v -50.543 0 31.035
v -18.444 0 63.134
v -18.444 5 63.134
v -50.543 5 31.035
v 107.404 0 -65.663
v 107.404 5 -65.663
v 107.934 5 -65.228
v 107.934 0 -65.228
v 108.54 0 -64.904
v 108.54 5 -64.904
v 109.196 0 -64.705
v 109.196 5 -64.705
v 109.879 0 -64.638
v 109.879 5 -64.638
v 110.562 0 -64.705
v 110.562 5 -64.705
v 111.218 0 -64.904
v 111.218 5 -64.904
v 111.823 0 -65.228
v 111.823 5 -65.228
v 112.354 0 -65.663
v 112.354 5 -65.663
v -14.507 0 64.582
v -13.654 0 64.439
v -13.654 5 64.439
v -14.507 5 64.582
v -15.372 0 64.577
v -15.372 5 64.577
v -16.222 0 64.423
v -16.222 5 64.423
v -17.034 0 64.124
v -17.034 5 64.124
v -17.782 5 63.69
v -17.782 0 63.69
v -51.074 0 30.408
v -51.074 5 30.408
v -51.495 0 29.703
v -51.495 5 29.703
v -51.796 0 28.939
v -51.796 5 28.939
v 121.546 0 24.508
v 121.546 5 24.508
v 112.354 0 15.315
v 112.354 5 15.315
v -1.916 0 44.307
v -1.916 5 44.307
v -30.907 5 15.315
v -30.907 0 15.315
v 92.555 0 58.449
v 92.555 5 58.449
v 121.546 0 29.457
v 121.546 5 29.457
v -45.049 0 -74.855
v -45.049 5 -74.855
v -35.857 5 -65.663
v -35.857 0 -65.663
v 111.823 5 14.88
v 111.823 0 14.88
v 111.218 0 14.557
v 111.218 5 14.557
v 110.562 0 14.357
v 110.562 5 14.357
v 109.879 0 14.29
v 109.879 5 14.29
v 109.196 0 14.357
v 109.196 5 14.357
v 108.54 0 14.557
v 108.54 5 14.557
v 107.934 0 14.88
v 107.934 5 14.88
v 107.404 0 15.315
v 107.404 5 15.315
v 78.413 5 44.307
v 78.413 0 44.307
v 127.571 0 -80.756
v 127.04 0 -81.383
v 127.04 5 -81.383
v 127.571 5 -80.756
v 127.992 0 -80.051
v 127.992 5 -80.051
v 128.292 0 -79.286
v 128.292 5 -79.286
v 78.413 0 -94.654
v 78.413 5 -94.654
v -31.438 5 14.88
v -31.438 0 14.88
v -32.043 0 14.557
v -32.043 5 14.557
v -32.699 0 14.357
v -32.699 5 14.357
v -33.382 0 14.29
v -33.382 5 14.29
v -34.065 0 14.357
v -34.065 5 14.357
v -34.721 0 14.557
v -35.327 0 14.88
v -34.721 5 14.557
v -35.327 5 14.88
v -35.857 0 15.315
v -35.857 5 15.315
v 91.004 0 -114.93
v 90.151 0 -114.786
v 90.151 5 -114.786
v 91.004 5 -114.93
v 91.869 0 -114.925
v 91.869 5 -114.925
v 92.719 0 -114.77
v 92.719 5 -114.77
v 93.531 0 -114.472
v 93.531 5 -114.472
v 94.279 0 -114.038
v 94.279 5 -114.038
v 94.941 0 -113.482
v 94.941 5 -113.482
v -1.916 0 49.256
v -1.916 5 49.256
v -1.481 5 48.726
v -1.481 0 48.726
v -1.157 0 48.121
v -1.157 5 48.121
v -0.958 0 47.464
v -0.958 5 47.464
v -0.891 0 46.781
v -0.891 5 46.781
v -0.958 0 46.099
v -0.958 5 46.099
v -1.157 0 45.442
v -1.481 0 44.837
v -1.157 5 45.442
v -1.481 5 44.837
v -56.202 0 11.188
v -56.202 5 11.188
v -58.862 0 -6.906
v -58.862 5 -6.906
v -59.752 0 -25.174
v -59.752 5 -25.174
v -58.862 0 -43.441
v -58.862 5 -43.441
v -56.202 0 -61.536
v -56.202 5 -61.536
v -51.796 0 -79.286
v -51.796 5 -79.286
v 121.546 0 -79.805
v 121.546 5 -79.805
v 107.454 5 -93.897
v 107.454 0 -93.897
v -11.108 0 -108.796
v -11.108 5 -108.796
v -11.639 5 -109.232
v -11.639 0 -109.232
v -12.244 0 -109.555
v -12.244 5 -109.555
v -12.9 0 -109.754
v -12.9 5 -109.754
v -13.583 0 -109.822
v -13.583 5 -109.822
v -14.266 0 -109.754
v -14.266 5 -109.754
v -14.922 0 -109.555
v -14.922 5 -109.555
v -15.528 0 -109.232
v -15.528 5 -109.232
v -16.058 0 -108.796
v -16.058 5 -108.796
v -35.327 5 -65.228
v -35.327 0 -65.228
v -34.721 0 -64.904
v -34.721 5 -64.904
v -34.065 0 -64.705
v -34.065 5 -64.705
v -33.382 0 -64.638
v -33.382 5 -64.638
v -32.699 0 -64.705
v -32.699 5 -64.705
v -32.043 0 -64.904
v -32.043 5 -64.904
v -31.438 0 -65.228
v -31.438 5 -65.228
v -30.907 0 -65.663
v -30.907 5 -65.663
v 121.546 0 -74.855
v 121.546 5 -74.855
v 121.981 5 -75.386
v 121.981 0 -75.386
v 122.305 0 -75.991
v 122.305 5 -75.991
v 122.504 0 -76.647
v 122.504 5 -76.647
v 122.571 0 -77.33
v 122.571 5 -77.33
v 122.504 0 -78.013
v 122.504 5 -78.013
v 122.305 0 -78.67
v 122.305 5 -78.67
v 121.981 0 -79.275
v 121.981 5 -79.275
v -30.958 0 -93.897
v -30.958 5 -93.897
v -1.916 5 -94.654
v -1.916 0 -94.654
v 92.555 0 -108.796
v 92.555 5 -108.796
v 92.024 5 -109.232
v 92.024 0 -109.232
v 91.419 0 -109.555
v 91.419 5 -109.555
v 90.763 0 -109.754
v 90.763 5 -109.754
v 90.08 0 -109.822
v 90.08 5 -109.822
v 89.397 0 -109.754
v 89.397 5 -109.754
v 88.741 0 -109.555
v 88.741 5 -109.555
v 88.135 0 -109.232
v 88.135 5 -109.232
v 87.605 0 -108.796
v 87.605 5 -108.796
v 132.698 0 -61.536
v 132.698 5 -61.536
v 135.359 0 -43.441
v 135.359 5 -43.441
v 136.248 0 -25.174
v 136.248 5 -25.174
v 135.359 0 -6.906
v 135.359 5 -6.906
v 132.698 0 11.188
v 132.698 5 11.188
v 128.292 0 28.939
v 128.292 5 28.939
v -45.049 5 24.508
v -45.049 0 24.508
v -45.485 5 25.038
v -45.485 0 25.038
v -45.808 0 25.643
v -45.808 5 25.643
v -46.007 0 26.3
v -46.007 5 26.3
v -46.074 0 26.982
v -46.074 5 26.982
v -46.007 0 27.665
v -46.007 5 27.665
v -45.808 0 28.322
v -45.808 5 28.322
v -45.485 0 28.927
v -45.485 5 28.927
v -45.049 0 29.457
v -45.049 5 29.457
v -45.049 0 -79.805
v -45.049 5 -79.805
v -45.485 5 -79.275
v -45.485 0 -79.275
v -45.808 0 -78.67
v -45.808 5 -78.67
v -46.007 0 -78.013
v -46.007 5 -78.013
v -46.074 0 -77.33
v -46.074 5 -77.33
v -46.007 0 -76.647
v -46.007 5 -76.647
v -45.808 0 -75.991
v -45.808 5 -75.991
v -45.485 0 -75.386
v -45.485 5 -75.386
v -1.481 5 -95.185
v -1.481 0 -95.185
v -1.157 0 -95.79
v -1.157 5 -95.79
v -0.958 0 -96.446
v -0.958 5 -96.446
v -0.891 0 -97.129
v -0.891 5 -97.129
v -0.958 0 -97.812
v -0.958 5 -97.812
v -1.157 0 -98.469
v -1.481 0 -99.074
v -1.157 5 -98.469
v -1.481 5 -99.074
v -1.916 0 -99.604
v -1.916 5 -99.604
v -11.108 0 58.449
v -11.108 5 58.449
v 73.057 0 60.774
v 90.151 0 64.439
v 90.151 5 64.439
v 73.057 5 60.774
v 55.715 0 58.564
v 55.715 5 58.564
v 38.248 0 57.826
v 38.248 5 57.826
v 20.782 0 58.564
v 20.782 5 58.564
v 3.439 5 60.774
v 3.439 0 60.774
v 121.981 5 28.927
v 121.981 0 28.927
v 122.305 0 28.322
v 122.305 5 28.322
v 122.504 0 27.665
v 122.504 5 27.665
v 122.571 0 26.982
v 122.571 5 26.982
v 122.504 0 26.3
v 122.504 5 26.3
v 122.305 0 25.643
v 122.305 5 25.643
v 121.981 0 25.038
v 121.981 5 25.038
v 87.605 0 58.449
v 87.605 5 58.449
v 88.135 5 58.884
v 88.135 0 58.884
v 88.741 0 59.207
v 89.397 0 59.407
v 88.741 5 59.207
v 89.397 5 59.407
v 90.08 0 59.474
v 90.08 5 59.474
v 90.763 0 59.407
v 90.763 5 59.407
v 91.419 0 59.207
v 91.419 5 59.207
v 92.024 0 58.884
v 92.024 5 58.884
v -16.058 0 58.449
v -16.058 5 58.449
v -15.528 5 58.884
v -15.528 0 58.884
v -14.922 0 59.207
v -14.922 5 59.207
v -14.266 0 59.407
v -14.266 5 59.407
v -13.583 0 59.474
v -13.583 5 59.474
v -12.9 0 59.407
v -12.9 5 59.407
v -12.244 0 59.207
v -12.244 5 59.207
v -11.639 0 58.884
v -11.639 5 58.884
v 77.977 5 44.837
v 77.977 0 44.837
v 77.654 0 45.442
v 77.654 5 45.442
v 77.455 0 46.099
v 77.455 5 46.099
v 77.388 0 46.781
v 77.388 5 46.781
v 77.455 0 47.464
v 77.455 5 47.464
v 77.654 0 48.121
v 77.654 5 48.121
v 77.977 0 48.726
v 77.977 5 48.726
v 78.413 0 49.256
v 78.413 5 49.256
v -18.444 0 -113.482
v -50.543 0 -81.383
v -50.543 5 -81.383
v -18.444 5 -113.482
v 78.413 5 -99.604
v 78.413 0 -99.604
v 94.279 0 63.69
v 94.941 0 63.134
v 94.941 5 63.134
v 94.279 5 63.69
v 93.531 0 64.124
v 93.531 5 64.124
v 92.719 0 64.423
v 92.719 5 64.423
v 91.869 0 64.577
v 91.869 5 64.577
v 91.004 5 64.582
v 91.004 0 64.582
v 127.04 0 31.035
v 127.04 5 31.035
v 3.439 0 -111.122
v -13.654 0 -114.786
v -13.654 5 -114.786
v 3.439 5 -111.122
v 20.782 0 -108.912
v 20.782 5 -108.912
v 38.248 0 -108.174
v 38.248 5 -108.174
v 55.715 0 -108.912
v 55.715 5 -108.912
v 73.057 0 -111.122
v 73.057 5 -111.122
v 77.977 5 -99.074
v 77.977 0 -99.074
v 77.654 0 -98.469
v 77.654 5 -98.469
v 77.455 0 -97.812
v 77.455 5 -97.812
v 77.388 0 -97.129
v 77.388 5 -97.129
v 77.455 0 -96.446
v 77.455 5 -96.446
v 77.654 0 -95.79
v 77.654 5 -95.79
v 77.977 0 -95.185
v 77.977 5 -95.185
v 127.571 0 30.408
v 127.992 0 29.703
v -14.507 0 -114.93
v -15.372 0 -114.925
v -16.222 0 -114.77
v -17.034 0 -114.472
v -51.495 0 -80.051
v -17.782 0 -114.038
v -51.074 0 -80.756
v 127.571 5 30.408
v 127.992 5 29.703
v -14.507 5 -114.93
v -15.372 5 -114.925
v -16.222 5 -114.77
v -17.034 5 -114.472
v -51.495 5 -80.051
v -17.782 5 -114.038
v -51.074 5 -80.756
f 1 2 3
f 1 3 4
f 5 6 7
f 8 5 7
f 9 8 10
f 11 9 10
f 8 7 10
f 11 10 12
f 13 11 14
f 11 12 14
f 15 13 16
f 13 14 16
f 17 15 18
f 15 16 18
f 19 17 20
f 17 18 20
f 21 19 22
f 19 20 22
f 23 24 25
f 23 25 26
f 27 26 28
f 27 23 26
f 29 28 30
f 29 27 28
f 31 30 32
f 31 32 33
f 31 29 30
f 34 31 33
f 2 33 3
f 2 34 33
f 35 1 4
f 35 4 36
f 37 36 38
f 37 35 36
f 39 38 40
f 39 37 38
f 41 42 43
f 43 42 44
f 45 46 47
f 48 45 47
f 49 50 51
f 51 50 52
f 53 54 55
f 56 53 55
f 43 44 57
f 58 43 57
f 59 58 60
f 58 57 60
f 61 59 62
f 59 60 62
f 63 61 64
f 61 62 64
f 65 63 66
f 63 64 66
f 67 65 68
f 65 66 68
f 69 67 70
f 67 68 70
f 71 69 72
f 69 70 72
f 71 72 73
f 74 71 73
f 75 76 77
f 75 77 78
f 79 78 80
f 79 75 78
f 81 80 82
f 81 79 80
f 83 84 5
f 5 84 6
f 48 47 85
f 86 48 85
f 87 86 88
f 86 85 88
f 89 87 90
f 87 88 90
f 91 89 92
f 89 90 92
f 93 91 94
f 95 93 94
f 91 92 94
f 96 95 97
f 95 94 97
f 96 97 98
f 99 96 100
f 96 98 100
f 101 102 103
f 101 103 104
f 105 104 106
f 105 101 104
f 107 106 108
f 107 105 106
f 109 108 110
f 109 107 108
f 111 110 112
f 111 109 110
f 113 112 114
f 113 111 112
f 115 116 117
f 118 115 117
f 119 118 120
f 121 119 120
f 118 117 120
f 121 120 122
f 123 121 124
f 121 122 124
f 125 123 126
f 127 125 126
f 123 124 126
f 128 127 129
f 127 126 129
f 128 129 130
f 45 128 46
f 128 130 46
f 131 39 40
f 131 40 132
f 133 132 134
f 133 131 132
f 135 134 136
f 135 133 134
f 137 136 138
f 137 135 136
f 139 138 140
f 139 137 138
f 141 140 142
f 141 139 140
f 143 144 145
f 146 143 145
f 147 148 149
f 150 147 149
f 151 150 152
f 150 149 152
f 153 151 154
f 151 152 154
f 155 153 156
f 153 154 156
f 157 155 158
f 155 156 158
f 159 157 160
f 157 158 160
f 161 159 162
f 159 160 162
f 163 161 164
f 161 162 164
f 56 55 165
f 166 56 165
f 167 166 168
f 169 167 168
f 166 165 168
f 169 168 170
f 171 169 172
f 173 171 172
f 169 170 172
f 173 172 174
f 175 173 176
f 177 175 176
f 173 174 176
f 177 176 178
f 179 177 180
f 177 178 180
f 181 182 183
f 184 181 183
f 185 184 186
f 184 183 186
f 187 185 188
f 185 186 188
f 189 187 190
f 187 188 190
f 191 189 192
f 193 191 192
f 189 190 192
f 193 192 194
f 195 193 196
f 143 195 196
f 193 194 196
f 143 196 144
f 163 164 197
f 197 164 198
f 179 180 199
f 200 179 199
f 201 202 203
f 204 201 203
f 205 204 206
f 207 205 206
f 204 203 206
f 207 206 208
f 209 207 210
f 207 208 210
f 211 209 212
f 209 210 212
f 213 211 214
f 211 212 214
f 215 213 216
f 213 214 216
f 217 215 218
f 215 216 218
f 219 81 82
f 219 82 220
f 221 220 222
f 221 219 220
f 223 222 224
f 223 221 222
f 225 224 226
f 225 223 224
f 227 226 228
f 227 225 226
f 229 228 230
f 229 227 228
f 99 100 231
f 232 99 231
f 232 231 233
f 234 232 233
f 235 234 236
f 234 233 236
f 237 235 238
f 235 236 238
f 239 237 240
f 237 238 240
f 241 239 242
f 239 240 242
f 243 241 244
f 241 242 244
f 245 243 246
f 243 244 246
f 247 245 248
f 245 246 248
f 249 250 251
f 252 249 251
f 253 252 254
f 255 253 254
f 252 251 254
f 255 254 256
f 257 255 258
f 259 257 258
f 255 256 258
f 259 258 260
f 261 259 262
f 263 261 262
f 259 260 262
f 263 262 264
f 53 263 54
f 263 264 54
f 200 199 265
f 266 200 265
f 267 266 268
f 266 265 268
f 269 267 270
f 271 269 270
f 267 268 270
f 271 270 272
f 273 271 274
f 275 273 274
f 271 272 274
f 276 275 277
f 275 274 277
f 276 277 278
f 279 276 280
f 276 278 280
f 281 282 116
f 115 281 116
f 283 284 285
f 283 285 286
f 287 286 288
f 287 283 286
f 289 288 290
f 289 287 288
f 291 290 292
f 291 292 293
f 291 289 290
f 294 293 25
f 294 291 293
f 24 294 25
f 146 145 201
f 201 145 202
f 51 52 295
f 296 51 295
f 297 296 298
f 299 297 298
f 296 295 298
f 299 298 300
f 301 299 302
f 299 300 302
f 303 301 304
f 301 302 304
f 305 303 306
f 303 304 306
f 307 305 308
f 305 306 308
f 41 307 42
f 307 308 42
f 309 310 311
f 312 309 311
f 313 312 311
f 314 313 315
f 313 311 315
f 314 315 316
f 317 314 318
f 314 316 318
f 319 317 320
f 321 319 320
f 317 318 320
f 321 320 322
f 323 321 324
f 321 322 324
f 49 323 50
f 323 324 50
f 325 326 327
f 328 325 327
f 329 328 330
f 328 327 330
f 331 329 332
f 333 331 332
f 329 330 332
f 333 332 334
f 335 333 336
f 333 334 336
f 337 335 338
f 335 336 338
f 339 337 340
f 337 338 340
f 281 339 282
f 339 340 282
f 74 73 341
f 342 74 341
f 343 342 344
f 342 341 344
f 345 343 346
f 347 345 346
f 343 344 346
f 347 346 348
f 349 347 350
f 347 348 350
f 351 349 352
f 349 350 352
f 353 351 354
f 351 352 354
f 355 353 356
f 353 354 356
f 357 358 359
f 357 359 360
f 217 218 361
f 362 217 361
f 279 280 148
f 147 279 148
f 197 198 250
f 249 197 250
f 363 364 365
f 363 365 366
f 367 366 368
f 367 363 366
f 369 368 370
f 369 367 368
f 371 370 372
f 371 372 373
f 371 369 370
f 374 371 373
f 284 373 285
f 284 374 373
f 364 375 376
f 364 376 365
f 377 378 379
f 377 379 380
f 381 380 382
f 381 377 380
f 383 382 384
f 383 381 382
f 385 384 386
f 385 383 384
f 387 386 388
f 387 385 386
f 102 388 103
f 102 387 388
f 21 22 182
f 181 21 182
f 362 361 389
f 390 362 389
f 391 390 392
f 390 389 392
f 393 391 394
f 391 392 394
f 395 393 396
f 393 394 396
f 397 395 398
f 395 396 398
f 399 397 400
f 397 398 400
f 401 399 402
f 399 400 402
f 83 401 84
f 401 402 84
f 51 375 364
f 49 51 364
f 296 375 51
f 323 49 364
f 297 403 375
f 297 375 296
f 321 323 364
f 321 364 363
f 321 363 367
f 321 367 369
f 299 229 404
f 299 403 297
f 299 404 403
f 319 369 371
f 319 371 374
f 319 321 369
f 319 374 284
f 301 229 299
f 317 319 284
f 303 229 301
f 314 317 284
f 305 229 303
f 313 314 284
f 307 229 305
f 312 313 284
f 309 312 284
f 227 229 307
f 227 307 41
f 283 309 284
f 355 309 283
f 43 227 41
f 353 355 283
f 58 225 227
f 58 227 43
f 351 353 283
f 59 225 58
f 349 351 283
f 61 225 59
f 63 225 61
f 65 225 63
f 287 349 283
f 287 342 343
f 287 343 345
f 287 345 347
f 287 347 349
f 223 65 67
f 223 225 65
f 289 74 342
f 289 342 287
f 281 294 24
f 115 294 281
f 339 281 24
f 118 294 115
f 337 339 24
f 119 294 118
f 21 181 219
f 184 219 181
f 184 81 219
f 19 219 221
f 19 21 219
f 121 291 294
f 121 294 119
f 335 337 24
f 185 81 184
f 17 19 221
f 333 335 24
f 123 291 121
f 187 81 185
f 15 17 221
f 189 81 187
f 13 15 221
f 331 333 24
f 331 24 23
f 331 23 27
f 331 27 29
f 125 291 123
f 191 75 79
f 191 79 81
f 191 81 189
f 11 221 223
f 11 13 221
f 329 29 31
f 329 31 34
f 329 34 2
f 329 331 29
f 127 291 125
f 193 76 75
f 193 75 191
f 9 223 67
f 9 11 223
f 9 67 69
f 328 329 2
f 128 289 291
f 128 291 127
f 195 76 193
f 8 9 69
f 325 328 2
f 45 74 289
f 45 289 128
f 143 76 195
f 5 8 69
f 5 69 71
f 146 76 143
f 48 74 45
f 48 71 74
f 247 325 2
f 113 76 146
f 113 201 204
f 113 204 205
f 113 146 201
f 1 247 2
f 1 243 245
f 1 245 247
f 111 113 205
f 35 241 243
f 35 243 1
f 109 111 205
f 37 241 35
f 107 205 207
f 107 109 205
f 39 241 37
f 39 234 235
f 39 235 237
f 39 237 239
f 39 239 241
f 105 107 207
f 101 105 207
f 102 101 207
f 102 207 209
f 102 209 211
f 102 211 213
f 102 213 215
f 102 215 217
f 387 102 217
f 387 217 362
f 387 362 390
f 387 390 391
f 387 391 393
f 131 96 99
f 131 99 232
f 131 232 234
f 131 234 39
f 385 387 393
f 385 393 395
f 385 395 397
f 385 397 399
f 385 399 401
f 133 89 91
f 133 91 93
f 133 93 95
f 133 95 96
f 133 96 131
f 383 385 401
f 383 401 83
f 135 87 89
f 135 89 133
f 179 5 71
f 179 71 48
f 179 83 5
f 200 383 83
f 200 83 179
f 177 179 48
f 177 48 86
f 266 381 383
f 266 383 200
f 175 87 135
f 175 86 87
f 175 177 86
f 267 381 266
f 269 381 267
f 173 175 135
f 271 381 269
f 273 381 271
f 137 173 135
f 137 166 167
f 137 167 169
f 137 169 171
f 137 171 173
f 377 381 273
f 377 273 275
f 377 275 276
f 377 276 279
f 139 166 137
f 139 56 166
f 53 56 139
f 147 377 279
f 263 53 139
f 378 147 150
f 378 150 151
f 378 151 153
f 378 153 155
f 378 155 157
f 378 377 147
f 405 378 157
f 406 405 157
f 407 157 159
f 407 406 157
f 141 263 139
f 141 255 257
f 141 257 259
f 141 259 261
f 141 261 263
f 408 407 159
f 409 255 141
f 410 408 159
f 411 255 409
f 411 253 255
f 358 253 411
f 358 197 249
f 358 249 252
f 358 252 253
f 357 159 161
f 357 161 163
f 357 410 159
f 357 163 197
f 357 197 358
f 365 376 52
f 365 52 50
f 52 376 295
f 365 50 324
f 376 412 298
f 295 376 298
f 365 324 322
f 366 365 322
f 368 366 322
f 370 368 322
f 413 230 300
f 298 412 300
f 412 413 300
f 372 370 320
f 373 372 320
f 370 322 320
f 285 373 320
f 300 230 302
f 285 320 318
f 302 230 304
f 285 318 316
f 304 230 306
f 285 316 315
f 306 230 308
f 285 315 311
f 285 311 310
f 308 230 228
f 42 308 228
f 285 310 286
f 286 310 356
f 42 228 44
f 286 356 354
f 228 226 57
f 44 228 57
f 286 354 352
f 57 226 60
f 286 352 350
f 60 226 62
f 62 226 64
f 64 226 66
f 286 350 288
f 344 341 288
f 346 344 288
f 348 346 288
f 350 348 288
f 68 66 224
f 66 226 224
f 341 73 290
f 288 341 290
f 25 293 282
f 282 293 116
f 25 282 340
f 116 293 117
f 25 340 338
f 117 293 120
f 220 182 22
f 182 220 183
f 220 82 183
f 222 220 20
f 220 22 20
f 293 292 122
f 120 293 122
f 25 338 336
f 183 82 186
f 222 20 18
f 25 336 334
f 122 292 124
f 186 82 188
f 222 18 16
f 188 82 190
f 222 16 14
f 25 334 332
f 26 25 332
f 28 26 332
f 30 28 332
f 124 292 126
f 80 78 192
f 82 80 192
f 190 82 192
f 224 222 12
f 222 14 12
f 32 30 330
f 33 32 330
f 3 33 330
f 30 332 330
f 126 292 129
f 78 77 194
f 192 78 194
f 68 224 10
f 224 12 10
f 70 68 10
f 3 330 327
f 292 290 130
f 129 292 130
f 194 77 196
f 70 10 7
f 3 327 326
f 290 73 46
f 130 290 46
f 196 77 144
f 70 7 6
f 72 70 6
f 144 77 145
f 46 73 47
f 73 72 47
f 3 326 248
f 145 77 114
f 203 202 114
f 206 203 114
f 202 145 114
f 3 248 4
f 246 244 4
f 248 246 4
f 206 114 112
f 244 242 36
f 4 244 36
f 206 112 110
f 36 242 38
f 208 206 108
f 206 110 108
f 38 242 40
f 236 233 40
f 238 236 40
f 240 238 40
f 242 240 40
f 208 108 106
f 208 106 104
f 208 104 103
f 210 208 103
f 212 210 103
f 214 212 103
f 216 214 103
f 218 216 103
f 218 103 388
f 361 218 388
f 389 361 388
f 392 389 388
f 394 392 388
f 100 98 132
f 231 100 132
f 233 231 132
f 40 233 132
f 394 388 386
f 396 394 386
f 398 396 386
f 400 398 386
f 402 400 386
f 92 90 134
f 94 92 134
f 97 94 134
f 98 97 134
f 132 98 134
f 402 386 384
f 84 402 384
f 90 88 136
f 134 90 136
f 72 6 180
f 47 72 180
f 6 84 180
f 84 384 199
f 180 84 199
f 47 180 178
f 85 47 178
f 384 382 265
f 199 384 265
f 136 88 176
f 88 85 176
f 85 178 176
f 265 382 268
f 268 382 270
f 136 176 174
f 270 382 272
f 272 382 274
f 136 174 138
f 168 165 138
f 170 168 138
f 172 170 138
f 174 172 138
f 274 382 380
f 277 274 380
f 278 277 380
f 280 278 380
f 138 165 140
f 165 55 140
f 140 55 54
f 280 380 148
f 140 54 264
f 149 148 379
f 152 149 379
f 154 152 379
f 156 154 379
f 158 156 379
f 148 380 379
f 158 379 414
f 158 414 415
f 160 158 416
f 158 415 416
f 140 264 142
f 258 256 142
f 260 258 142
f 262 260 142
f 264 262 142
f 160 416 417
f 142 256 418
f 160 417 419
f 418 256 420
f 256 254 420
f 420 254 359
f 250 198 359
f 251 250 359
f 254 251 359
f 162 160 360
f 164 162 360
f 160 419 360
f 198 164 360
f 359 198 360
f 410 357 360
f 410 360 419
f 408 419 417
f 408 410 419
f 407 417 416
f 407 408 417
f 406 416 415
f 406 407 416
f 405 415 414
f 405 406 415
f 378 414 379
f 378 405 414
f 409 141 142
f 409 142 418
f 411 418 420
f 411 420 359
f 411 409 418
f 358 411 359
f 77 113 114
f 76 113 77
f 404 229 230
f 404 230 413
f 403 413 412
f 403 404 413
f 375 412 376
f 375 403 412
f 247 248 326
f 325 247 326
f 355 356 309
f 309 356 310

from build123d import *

# Parameters (mm, degrees)
RESSALTO_EXTRUS_O2_DEPTH = 5
CORTE_EXTRUS_O1_DEPTH    = 5


with BuildPart() as part:
    # Esboço1 → Ressalto-extrusão2 (new body)
    with BuildSketch(Plane(origin=(0, 0, 0), x_dir=(1, 0, 0), z_dir=(0, 1, 0))):
        with BuildLine():
            Line((-50.542684331, 81.382727595), (-18.443667531, 113.481744396))
            ThreePointArc((-18.443667531, 113.481744396), (-16.222396505, 114.770390532), (-13.65444113, 114.786484772))
            ThreePointArc((-13.65444113, 114.786484772), (38.248428139, 108.173840066), (90.151297409, 114.786484772))
            ThreePointArc((90.151297409, 114.786484772), (92.719252784, 114.770390532), (94.94052381, 113.481744396))
            Line((94.94052381, 113.481744396), (127.03954061, 81.382727595))
            ThreePointArc((127.03954061, 81.382727595), (127.79593841, 80.412212643), (128.29241049, 79.286356356))
            ThreePointArc((128.29241049, 79.286356356), (136.248428139, 25.173840066), (128.29241049, -28.938676225))
            ThreePointArc((128.29241049, -28.938676225), (127.79593841, -30.064532511), (127.03954061, -31.035047464))
            Line((127.03954061, -31.035047464), (94.94052381, -63.134064264))
            ThreePointArc((94.94052381, -63.134064264), (92.719252784, -64.4227104), (90.151297409, -64.438804641))
            ThreePointArc((90.151297409, -64.438804641), (38.248428139, -57.826159934), (-13.65444113, -64.438804641))
            ThreePointArc((-13.65444113, -64.438804641), (-16.222396505, -64.4227104), (-18.443667531, -63.134064264))
            Line((-18.443667531, -63.134064264), (-50.542684331, -31.035047464))
            ThreePointArc((-50.542684331, -31.035047464), (-51.299082131, -30.064532511), (-51.795554211, -28.938676225))
            ThreePointArc((-51.795554211, -28.938676225), (-59.751571861, 25.173840066), (-51.795554211, 79.286356356))
            ThreePointArc((-51.795554211, 79.286356356), (-51.299082131, 80.412212643), (-50.542684331, 81.382727595))
        make_face()
    extrude(amount=RESSALTO_EXTRUS_O2_DEPTH)

    # Esboço2 → Corte-extrusão1 (cut)
    with BuildSketch(Plane(origin=(0, 5, 0), x_dir=(1, 0, 0), z_dir=(0, 1, 0))):
        with BuildLine():
            Line((-30.957642025, 93.896702089), (-45.049304874, 79.805039241))
            ThreePointArc((-45.049304874, 79.805039241), (-46.07443114, 77.330165506), (-45.049304874, 74.855291772))
            Line((-45.049304874, 74.855291772), (-35.856916719, 65.662903617))
            ThreePointArc((-35.856916719, 65.662903617), (-33.382042984, 64.637777351), (-30.90716925, 65.662903617))
            Line((-30.90716925, 65.662903617), (-1.915791222, 94.654281645))
            ThreePointArc((-1.915791222, 94.654281645), (-0.890664956, 97.12915538), (-1.915791222, 99.604029114))
            Line((-1.915791222, 99.604029114), (-11.108179377, 108.796417269))
            ThreePointArc((-11.108179377, 108.796417269), (-13.583053111, 109.821543535), (-16.057926845, 108.796417269))
            Line((-16.057926845, 108.796417269), (-30.957642025, 93.896702089))
        make_face()
        with BuildLine():
            Line((-30.957642025, -43.549021958), (-16.057926845, -58.448737138))
            ThreePointArc((-16.057926845, -58.448737138), (-13.583053111, -59.473863403), (-11.108179377, -58.448737138))
            Line((-11.108179377, -58.448737138), (-1.915791222, -49.256348982))
            ThreePointArc((-1.915791222, -49.256348982), (-0.890664956, -46.781475248), (-1.915791222, -44.306601514))
            Line((-1.915791222, -44.306601514), (-30.90716925, -15.315223485))
            ThreePointArc((-30.90716925, -15.315223485), (-33.382042984, -14.290097219), (-35.856916719, -15.315223485))
            Line((-35.856916719, -15.315223485), (-45.049304874, -24.507611641))
            ThreePointArc((-45.049304874, -24.507611641), (-46.07443114, -26.982485375), (-45.049304874, -29.457359109))
            Line((-45.049304874, -29.457359109), (-30.957642025, -43.549021958))
        make_face()
        with BuildLine():
            Line((107.454498304, -43.549021958), (121.546161153, -29.457359109))
            ThreePointArc((121.546161153, -29.457359109), (122.571287419, -26.982485375), (121.546161153, -24.507611641))
            Line((121.546161153, -24.507611641), (112.353772997, -15.315223485))
            ThreePointArc((112.353772997, -15.315223485), (109.878899263, -14.290097219), (107.404025529, -15.315223485))
            Line((107.404025529, -15.315223485), (78.4126475, -44.306601514))
            ThreePointArc((78.4126475, -44.306601514), (77.387521235, -46.781475248), (78.4126475, -49.256348982))
            Line((78.4126475, -49.256348982), (87.605035656, -58.448737138))
            ThreePointArc((87.605035656, -58.448737138), (90.07990939, -59.473863403), (92.554783124, -58.448737138))
            Line((92.554783124, -58.448737138), (107.454498304, -43.549021958))
        make_face()
        with BuildLine():
            Line((87.605035656, 108.796417269), (78.4126475, 99.604029114))
            ThreePointArc((78.4126475, 99.604029114), (77.387521235, 97.12915538), (78.4126475, 94.654281645))
            Line((78.4126475, 94.654281645), (107.404025529, 65.662903617))
            ThreePointArc((107.404025529, 65.662903617), (109.878899263, 64.637777351), (112.353772997, 65.662903617))
            Line((112.353772997, 65.662903617), (121.546161153, 74.855291772))
            ThreePointArc((121.546161153, 74.855291772), (122.571287419, 77.330165506), (121.546161153, 79.805039241))
            Line((121.546161153, 79.805039241), (107.454498304, 93.896702089))
            Line((107.454498304, 93.896702089), (92.554783124, 108.796417269))
            ThreePointArc((92.554783124, 108.796417269), (90.07990939, 109.821543535), (87.605035656, 108.796417269))
        make_face()
    extrude(amount=-CORTE_EXTRUS_O1_DEPTH, mode=Mode.SUBTRACT)


solid = part.part
